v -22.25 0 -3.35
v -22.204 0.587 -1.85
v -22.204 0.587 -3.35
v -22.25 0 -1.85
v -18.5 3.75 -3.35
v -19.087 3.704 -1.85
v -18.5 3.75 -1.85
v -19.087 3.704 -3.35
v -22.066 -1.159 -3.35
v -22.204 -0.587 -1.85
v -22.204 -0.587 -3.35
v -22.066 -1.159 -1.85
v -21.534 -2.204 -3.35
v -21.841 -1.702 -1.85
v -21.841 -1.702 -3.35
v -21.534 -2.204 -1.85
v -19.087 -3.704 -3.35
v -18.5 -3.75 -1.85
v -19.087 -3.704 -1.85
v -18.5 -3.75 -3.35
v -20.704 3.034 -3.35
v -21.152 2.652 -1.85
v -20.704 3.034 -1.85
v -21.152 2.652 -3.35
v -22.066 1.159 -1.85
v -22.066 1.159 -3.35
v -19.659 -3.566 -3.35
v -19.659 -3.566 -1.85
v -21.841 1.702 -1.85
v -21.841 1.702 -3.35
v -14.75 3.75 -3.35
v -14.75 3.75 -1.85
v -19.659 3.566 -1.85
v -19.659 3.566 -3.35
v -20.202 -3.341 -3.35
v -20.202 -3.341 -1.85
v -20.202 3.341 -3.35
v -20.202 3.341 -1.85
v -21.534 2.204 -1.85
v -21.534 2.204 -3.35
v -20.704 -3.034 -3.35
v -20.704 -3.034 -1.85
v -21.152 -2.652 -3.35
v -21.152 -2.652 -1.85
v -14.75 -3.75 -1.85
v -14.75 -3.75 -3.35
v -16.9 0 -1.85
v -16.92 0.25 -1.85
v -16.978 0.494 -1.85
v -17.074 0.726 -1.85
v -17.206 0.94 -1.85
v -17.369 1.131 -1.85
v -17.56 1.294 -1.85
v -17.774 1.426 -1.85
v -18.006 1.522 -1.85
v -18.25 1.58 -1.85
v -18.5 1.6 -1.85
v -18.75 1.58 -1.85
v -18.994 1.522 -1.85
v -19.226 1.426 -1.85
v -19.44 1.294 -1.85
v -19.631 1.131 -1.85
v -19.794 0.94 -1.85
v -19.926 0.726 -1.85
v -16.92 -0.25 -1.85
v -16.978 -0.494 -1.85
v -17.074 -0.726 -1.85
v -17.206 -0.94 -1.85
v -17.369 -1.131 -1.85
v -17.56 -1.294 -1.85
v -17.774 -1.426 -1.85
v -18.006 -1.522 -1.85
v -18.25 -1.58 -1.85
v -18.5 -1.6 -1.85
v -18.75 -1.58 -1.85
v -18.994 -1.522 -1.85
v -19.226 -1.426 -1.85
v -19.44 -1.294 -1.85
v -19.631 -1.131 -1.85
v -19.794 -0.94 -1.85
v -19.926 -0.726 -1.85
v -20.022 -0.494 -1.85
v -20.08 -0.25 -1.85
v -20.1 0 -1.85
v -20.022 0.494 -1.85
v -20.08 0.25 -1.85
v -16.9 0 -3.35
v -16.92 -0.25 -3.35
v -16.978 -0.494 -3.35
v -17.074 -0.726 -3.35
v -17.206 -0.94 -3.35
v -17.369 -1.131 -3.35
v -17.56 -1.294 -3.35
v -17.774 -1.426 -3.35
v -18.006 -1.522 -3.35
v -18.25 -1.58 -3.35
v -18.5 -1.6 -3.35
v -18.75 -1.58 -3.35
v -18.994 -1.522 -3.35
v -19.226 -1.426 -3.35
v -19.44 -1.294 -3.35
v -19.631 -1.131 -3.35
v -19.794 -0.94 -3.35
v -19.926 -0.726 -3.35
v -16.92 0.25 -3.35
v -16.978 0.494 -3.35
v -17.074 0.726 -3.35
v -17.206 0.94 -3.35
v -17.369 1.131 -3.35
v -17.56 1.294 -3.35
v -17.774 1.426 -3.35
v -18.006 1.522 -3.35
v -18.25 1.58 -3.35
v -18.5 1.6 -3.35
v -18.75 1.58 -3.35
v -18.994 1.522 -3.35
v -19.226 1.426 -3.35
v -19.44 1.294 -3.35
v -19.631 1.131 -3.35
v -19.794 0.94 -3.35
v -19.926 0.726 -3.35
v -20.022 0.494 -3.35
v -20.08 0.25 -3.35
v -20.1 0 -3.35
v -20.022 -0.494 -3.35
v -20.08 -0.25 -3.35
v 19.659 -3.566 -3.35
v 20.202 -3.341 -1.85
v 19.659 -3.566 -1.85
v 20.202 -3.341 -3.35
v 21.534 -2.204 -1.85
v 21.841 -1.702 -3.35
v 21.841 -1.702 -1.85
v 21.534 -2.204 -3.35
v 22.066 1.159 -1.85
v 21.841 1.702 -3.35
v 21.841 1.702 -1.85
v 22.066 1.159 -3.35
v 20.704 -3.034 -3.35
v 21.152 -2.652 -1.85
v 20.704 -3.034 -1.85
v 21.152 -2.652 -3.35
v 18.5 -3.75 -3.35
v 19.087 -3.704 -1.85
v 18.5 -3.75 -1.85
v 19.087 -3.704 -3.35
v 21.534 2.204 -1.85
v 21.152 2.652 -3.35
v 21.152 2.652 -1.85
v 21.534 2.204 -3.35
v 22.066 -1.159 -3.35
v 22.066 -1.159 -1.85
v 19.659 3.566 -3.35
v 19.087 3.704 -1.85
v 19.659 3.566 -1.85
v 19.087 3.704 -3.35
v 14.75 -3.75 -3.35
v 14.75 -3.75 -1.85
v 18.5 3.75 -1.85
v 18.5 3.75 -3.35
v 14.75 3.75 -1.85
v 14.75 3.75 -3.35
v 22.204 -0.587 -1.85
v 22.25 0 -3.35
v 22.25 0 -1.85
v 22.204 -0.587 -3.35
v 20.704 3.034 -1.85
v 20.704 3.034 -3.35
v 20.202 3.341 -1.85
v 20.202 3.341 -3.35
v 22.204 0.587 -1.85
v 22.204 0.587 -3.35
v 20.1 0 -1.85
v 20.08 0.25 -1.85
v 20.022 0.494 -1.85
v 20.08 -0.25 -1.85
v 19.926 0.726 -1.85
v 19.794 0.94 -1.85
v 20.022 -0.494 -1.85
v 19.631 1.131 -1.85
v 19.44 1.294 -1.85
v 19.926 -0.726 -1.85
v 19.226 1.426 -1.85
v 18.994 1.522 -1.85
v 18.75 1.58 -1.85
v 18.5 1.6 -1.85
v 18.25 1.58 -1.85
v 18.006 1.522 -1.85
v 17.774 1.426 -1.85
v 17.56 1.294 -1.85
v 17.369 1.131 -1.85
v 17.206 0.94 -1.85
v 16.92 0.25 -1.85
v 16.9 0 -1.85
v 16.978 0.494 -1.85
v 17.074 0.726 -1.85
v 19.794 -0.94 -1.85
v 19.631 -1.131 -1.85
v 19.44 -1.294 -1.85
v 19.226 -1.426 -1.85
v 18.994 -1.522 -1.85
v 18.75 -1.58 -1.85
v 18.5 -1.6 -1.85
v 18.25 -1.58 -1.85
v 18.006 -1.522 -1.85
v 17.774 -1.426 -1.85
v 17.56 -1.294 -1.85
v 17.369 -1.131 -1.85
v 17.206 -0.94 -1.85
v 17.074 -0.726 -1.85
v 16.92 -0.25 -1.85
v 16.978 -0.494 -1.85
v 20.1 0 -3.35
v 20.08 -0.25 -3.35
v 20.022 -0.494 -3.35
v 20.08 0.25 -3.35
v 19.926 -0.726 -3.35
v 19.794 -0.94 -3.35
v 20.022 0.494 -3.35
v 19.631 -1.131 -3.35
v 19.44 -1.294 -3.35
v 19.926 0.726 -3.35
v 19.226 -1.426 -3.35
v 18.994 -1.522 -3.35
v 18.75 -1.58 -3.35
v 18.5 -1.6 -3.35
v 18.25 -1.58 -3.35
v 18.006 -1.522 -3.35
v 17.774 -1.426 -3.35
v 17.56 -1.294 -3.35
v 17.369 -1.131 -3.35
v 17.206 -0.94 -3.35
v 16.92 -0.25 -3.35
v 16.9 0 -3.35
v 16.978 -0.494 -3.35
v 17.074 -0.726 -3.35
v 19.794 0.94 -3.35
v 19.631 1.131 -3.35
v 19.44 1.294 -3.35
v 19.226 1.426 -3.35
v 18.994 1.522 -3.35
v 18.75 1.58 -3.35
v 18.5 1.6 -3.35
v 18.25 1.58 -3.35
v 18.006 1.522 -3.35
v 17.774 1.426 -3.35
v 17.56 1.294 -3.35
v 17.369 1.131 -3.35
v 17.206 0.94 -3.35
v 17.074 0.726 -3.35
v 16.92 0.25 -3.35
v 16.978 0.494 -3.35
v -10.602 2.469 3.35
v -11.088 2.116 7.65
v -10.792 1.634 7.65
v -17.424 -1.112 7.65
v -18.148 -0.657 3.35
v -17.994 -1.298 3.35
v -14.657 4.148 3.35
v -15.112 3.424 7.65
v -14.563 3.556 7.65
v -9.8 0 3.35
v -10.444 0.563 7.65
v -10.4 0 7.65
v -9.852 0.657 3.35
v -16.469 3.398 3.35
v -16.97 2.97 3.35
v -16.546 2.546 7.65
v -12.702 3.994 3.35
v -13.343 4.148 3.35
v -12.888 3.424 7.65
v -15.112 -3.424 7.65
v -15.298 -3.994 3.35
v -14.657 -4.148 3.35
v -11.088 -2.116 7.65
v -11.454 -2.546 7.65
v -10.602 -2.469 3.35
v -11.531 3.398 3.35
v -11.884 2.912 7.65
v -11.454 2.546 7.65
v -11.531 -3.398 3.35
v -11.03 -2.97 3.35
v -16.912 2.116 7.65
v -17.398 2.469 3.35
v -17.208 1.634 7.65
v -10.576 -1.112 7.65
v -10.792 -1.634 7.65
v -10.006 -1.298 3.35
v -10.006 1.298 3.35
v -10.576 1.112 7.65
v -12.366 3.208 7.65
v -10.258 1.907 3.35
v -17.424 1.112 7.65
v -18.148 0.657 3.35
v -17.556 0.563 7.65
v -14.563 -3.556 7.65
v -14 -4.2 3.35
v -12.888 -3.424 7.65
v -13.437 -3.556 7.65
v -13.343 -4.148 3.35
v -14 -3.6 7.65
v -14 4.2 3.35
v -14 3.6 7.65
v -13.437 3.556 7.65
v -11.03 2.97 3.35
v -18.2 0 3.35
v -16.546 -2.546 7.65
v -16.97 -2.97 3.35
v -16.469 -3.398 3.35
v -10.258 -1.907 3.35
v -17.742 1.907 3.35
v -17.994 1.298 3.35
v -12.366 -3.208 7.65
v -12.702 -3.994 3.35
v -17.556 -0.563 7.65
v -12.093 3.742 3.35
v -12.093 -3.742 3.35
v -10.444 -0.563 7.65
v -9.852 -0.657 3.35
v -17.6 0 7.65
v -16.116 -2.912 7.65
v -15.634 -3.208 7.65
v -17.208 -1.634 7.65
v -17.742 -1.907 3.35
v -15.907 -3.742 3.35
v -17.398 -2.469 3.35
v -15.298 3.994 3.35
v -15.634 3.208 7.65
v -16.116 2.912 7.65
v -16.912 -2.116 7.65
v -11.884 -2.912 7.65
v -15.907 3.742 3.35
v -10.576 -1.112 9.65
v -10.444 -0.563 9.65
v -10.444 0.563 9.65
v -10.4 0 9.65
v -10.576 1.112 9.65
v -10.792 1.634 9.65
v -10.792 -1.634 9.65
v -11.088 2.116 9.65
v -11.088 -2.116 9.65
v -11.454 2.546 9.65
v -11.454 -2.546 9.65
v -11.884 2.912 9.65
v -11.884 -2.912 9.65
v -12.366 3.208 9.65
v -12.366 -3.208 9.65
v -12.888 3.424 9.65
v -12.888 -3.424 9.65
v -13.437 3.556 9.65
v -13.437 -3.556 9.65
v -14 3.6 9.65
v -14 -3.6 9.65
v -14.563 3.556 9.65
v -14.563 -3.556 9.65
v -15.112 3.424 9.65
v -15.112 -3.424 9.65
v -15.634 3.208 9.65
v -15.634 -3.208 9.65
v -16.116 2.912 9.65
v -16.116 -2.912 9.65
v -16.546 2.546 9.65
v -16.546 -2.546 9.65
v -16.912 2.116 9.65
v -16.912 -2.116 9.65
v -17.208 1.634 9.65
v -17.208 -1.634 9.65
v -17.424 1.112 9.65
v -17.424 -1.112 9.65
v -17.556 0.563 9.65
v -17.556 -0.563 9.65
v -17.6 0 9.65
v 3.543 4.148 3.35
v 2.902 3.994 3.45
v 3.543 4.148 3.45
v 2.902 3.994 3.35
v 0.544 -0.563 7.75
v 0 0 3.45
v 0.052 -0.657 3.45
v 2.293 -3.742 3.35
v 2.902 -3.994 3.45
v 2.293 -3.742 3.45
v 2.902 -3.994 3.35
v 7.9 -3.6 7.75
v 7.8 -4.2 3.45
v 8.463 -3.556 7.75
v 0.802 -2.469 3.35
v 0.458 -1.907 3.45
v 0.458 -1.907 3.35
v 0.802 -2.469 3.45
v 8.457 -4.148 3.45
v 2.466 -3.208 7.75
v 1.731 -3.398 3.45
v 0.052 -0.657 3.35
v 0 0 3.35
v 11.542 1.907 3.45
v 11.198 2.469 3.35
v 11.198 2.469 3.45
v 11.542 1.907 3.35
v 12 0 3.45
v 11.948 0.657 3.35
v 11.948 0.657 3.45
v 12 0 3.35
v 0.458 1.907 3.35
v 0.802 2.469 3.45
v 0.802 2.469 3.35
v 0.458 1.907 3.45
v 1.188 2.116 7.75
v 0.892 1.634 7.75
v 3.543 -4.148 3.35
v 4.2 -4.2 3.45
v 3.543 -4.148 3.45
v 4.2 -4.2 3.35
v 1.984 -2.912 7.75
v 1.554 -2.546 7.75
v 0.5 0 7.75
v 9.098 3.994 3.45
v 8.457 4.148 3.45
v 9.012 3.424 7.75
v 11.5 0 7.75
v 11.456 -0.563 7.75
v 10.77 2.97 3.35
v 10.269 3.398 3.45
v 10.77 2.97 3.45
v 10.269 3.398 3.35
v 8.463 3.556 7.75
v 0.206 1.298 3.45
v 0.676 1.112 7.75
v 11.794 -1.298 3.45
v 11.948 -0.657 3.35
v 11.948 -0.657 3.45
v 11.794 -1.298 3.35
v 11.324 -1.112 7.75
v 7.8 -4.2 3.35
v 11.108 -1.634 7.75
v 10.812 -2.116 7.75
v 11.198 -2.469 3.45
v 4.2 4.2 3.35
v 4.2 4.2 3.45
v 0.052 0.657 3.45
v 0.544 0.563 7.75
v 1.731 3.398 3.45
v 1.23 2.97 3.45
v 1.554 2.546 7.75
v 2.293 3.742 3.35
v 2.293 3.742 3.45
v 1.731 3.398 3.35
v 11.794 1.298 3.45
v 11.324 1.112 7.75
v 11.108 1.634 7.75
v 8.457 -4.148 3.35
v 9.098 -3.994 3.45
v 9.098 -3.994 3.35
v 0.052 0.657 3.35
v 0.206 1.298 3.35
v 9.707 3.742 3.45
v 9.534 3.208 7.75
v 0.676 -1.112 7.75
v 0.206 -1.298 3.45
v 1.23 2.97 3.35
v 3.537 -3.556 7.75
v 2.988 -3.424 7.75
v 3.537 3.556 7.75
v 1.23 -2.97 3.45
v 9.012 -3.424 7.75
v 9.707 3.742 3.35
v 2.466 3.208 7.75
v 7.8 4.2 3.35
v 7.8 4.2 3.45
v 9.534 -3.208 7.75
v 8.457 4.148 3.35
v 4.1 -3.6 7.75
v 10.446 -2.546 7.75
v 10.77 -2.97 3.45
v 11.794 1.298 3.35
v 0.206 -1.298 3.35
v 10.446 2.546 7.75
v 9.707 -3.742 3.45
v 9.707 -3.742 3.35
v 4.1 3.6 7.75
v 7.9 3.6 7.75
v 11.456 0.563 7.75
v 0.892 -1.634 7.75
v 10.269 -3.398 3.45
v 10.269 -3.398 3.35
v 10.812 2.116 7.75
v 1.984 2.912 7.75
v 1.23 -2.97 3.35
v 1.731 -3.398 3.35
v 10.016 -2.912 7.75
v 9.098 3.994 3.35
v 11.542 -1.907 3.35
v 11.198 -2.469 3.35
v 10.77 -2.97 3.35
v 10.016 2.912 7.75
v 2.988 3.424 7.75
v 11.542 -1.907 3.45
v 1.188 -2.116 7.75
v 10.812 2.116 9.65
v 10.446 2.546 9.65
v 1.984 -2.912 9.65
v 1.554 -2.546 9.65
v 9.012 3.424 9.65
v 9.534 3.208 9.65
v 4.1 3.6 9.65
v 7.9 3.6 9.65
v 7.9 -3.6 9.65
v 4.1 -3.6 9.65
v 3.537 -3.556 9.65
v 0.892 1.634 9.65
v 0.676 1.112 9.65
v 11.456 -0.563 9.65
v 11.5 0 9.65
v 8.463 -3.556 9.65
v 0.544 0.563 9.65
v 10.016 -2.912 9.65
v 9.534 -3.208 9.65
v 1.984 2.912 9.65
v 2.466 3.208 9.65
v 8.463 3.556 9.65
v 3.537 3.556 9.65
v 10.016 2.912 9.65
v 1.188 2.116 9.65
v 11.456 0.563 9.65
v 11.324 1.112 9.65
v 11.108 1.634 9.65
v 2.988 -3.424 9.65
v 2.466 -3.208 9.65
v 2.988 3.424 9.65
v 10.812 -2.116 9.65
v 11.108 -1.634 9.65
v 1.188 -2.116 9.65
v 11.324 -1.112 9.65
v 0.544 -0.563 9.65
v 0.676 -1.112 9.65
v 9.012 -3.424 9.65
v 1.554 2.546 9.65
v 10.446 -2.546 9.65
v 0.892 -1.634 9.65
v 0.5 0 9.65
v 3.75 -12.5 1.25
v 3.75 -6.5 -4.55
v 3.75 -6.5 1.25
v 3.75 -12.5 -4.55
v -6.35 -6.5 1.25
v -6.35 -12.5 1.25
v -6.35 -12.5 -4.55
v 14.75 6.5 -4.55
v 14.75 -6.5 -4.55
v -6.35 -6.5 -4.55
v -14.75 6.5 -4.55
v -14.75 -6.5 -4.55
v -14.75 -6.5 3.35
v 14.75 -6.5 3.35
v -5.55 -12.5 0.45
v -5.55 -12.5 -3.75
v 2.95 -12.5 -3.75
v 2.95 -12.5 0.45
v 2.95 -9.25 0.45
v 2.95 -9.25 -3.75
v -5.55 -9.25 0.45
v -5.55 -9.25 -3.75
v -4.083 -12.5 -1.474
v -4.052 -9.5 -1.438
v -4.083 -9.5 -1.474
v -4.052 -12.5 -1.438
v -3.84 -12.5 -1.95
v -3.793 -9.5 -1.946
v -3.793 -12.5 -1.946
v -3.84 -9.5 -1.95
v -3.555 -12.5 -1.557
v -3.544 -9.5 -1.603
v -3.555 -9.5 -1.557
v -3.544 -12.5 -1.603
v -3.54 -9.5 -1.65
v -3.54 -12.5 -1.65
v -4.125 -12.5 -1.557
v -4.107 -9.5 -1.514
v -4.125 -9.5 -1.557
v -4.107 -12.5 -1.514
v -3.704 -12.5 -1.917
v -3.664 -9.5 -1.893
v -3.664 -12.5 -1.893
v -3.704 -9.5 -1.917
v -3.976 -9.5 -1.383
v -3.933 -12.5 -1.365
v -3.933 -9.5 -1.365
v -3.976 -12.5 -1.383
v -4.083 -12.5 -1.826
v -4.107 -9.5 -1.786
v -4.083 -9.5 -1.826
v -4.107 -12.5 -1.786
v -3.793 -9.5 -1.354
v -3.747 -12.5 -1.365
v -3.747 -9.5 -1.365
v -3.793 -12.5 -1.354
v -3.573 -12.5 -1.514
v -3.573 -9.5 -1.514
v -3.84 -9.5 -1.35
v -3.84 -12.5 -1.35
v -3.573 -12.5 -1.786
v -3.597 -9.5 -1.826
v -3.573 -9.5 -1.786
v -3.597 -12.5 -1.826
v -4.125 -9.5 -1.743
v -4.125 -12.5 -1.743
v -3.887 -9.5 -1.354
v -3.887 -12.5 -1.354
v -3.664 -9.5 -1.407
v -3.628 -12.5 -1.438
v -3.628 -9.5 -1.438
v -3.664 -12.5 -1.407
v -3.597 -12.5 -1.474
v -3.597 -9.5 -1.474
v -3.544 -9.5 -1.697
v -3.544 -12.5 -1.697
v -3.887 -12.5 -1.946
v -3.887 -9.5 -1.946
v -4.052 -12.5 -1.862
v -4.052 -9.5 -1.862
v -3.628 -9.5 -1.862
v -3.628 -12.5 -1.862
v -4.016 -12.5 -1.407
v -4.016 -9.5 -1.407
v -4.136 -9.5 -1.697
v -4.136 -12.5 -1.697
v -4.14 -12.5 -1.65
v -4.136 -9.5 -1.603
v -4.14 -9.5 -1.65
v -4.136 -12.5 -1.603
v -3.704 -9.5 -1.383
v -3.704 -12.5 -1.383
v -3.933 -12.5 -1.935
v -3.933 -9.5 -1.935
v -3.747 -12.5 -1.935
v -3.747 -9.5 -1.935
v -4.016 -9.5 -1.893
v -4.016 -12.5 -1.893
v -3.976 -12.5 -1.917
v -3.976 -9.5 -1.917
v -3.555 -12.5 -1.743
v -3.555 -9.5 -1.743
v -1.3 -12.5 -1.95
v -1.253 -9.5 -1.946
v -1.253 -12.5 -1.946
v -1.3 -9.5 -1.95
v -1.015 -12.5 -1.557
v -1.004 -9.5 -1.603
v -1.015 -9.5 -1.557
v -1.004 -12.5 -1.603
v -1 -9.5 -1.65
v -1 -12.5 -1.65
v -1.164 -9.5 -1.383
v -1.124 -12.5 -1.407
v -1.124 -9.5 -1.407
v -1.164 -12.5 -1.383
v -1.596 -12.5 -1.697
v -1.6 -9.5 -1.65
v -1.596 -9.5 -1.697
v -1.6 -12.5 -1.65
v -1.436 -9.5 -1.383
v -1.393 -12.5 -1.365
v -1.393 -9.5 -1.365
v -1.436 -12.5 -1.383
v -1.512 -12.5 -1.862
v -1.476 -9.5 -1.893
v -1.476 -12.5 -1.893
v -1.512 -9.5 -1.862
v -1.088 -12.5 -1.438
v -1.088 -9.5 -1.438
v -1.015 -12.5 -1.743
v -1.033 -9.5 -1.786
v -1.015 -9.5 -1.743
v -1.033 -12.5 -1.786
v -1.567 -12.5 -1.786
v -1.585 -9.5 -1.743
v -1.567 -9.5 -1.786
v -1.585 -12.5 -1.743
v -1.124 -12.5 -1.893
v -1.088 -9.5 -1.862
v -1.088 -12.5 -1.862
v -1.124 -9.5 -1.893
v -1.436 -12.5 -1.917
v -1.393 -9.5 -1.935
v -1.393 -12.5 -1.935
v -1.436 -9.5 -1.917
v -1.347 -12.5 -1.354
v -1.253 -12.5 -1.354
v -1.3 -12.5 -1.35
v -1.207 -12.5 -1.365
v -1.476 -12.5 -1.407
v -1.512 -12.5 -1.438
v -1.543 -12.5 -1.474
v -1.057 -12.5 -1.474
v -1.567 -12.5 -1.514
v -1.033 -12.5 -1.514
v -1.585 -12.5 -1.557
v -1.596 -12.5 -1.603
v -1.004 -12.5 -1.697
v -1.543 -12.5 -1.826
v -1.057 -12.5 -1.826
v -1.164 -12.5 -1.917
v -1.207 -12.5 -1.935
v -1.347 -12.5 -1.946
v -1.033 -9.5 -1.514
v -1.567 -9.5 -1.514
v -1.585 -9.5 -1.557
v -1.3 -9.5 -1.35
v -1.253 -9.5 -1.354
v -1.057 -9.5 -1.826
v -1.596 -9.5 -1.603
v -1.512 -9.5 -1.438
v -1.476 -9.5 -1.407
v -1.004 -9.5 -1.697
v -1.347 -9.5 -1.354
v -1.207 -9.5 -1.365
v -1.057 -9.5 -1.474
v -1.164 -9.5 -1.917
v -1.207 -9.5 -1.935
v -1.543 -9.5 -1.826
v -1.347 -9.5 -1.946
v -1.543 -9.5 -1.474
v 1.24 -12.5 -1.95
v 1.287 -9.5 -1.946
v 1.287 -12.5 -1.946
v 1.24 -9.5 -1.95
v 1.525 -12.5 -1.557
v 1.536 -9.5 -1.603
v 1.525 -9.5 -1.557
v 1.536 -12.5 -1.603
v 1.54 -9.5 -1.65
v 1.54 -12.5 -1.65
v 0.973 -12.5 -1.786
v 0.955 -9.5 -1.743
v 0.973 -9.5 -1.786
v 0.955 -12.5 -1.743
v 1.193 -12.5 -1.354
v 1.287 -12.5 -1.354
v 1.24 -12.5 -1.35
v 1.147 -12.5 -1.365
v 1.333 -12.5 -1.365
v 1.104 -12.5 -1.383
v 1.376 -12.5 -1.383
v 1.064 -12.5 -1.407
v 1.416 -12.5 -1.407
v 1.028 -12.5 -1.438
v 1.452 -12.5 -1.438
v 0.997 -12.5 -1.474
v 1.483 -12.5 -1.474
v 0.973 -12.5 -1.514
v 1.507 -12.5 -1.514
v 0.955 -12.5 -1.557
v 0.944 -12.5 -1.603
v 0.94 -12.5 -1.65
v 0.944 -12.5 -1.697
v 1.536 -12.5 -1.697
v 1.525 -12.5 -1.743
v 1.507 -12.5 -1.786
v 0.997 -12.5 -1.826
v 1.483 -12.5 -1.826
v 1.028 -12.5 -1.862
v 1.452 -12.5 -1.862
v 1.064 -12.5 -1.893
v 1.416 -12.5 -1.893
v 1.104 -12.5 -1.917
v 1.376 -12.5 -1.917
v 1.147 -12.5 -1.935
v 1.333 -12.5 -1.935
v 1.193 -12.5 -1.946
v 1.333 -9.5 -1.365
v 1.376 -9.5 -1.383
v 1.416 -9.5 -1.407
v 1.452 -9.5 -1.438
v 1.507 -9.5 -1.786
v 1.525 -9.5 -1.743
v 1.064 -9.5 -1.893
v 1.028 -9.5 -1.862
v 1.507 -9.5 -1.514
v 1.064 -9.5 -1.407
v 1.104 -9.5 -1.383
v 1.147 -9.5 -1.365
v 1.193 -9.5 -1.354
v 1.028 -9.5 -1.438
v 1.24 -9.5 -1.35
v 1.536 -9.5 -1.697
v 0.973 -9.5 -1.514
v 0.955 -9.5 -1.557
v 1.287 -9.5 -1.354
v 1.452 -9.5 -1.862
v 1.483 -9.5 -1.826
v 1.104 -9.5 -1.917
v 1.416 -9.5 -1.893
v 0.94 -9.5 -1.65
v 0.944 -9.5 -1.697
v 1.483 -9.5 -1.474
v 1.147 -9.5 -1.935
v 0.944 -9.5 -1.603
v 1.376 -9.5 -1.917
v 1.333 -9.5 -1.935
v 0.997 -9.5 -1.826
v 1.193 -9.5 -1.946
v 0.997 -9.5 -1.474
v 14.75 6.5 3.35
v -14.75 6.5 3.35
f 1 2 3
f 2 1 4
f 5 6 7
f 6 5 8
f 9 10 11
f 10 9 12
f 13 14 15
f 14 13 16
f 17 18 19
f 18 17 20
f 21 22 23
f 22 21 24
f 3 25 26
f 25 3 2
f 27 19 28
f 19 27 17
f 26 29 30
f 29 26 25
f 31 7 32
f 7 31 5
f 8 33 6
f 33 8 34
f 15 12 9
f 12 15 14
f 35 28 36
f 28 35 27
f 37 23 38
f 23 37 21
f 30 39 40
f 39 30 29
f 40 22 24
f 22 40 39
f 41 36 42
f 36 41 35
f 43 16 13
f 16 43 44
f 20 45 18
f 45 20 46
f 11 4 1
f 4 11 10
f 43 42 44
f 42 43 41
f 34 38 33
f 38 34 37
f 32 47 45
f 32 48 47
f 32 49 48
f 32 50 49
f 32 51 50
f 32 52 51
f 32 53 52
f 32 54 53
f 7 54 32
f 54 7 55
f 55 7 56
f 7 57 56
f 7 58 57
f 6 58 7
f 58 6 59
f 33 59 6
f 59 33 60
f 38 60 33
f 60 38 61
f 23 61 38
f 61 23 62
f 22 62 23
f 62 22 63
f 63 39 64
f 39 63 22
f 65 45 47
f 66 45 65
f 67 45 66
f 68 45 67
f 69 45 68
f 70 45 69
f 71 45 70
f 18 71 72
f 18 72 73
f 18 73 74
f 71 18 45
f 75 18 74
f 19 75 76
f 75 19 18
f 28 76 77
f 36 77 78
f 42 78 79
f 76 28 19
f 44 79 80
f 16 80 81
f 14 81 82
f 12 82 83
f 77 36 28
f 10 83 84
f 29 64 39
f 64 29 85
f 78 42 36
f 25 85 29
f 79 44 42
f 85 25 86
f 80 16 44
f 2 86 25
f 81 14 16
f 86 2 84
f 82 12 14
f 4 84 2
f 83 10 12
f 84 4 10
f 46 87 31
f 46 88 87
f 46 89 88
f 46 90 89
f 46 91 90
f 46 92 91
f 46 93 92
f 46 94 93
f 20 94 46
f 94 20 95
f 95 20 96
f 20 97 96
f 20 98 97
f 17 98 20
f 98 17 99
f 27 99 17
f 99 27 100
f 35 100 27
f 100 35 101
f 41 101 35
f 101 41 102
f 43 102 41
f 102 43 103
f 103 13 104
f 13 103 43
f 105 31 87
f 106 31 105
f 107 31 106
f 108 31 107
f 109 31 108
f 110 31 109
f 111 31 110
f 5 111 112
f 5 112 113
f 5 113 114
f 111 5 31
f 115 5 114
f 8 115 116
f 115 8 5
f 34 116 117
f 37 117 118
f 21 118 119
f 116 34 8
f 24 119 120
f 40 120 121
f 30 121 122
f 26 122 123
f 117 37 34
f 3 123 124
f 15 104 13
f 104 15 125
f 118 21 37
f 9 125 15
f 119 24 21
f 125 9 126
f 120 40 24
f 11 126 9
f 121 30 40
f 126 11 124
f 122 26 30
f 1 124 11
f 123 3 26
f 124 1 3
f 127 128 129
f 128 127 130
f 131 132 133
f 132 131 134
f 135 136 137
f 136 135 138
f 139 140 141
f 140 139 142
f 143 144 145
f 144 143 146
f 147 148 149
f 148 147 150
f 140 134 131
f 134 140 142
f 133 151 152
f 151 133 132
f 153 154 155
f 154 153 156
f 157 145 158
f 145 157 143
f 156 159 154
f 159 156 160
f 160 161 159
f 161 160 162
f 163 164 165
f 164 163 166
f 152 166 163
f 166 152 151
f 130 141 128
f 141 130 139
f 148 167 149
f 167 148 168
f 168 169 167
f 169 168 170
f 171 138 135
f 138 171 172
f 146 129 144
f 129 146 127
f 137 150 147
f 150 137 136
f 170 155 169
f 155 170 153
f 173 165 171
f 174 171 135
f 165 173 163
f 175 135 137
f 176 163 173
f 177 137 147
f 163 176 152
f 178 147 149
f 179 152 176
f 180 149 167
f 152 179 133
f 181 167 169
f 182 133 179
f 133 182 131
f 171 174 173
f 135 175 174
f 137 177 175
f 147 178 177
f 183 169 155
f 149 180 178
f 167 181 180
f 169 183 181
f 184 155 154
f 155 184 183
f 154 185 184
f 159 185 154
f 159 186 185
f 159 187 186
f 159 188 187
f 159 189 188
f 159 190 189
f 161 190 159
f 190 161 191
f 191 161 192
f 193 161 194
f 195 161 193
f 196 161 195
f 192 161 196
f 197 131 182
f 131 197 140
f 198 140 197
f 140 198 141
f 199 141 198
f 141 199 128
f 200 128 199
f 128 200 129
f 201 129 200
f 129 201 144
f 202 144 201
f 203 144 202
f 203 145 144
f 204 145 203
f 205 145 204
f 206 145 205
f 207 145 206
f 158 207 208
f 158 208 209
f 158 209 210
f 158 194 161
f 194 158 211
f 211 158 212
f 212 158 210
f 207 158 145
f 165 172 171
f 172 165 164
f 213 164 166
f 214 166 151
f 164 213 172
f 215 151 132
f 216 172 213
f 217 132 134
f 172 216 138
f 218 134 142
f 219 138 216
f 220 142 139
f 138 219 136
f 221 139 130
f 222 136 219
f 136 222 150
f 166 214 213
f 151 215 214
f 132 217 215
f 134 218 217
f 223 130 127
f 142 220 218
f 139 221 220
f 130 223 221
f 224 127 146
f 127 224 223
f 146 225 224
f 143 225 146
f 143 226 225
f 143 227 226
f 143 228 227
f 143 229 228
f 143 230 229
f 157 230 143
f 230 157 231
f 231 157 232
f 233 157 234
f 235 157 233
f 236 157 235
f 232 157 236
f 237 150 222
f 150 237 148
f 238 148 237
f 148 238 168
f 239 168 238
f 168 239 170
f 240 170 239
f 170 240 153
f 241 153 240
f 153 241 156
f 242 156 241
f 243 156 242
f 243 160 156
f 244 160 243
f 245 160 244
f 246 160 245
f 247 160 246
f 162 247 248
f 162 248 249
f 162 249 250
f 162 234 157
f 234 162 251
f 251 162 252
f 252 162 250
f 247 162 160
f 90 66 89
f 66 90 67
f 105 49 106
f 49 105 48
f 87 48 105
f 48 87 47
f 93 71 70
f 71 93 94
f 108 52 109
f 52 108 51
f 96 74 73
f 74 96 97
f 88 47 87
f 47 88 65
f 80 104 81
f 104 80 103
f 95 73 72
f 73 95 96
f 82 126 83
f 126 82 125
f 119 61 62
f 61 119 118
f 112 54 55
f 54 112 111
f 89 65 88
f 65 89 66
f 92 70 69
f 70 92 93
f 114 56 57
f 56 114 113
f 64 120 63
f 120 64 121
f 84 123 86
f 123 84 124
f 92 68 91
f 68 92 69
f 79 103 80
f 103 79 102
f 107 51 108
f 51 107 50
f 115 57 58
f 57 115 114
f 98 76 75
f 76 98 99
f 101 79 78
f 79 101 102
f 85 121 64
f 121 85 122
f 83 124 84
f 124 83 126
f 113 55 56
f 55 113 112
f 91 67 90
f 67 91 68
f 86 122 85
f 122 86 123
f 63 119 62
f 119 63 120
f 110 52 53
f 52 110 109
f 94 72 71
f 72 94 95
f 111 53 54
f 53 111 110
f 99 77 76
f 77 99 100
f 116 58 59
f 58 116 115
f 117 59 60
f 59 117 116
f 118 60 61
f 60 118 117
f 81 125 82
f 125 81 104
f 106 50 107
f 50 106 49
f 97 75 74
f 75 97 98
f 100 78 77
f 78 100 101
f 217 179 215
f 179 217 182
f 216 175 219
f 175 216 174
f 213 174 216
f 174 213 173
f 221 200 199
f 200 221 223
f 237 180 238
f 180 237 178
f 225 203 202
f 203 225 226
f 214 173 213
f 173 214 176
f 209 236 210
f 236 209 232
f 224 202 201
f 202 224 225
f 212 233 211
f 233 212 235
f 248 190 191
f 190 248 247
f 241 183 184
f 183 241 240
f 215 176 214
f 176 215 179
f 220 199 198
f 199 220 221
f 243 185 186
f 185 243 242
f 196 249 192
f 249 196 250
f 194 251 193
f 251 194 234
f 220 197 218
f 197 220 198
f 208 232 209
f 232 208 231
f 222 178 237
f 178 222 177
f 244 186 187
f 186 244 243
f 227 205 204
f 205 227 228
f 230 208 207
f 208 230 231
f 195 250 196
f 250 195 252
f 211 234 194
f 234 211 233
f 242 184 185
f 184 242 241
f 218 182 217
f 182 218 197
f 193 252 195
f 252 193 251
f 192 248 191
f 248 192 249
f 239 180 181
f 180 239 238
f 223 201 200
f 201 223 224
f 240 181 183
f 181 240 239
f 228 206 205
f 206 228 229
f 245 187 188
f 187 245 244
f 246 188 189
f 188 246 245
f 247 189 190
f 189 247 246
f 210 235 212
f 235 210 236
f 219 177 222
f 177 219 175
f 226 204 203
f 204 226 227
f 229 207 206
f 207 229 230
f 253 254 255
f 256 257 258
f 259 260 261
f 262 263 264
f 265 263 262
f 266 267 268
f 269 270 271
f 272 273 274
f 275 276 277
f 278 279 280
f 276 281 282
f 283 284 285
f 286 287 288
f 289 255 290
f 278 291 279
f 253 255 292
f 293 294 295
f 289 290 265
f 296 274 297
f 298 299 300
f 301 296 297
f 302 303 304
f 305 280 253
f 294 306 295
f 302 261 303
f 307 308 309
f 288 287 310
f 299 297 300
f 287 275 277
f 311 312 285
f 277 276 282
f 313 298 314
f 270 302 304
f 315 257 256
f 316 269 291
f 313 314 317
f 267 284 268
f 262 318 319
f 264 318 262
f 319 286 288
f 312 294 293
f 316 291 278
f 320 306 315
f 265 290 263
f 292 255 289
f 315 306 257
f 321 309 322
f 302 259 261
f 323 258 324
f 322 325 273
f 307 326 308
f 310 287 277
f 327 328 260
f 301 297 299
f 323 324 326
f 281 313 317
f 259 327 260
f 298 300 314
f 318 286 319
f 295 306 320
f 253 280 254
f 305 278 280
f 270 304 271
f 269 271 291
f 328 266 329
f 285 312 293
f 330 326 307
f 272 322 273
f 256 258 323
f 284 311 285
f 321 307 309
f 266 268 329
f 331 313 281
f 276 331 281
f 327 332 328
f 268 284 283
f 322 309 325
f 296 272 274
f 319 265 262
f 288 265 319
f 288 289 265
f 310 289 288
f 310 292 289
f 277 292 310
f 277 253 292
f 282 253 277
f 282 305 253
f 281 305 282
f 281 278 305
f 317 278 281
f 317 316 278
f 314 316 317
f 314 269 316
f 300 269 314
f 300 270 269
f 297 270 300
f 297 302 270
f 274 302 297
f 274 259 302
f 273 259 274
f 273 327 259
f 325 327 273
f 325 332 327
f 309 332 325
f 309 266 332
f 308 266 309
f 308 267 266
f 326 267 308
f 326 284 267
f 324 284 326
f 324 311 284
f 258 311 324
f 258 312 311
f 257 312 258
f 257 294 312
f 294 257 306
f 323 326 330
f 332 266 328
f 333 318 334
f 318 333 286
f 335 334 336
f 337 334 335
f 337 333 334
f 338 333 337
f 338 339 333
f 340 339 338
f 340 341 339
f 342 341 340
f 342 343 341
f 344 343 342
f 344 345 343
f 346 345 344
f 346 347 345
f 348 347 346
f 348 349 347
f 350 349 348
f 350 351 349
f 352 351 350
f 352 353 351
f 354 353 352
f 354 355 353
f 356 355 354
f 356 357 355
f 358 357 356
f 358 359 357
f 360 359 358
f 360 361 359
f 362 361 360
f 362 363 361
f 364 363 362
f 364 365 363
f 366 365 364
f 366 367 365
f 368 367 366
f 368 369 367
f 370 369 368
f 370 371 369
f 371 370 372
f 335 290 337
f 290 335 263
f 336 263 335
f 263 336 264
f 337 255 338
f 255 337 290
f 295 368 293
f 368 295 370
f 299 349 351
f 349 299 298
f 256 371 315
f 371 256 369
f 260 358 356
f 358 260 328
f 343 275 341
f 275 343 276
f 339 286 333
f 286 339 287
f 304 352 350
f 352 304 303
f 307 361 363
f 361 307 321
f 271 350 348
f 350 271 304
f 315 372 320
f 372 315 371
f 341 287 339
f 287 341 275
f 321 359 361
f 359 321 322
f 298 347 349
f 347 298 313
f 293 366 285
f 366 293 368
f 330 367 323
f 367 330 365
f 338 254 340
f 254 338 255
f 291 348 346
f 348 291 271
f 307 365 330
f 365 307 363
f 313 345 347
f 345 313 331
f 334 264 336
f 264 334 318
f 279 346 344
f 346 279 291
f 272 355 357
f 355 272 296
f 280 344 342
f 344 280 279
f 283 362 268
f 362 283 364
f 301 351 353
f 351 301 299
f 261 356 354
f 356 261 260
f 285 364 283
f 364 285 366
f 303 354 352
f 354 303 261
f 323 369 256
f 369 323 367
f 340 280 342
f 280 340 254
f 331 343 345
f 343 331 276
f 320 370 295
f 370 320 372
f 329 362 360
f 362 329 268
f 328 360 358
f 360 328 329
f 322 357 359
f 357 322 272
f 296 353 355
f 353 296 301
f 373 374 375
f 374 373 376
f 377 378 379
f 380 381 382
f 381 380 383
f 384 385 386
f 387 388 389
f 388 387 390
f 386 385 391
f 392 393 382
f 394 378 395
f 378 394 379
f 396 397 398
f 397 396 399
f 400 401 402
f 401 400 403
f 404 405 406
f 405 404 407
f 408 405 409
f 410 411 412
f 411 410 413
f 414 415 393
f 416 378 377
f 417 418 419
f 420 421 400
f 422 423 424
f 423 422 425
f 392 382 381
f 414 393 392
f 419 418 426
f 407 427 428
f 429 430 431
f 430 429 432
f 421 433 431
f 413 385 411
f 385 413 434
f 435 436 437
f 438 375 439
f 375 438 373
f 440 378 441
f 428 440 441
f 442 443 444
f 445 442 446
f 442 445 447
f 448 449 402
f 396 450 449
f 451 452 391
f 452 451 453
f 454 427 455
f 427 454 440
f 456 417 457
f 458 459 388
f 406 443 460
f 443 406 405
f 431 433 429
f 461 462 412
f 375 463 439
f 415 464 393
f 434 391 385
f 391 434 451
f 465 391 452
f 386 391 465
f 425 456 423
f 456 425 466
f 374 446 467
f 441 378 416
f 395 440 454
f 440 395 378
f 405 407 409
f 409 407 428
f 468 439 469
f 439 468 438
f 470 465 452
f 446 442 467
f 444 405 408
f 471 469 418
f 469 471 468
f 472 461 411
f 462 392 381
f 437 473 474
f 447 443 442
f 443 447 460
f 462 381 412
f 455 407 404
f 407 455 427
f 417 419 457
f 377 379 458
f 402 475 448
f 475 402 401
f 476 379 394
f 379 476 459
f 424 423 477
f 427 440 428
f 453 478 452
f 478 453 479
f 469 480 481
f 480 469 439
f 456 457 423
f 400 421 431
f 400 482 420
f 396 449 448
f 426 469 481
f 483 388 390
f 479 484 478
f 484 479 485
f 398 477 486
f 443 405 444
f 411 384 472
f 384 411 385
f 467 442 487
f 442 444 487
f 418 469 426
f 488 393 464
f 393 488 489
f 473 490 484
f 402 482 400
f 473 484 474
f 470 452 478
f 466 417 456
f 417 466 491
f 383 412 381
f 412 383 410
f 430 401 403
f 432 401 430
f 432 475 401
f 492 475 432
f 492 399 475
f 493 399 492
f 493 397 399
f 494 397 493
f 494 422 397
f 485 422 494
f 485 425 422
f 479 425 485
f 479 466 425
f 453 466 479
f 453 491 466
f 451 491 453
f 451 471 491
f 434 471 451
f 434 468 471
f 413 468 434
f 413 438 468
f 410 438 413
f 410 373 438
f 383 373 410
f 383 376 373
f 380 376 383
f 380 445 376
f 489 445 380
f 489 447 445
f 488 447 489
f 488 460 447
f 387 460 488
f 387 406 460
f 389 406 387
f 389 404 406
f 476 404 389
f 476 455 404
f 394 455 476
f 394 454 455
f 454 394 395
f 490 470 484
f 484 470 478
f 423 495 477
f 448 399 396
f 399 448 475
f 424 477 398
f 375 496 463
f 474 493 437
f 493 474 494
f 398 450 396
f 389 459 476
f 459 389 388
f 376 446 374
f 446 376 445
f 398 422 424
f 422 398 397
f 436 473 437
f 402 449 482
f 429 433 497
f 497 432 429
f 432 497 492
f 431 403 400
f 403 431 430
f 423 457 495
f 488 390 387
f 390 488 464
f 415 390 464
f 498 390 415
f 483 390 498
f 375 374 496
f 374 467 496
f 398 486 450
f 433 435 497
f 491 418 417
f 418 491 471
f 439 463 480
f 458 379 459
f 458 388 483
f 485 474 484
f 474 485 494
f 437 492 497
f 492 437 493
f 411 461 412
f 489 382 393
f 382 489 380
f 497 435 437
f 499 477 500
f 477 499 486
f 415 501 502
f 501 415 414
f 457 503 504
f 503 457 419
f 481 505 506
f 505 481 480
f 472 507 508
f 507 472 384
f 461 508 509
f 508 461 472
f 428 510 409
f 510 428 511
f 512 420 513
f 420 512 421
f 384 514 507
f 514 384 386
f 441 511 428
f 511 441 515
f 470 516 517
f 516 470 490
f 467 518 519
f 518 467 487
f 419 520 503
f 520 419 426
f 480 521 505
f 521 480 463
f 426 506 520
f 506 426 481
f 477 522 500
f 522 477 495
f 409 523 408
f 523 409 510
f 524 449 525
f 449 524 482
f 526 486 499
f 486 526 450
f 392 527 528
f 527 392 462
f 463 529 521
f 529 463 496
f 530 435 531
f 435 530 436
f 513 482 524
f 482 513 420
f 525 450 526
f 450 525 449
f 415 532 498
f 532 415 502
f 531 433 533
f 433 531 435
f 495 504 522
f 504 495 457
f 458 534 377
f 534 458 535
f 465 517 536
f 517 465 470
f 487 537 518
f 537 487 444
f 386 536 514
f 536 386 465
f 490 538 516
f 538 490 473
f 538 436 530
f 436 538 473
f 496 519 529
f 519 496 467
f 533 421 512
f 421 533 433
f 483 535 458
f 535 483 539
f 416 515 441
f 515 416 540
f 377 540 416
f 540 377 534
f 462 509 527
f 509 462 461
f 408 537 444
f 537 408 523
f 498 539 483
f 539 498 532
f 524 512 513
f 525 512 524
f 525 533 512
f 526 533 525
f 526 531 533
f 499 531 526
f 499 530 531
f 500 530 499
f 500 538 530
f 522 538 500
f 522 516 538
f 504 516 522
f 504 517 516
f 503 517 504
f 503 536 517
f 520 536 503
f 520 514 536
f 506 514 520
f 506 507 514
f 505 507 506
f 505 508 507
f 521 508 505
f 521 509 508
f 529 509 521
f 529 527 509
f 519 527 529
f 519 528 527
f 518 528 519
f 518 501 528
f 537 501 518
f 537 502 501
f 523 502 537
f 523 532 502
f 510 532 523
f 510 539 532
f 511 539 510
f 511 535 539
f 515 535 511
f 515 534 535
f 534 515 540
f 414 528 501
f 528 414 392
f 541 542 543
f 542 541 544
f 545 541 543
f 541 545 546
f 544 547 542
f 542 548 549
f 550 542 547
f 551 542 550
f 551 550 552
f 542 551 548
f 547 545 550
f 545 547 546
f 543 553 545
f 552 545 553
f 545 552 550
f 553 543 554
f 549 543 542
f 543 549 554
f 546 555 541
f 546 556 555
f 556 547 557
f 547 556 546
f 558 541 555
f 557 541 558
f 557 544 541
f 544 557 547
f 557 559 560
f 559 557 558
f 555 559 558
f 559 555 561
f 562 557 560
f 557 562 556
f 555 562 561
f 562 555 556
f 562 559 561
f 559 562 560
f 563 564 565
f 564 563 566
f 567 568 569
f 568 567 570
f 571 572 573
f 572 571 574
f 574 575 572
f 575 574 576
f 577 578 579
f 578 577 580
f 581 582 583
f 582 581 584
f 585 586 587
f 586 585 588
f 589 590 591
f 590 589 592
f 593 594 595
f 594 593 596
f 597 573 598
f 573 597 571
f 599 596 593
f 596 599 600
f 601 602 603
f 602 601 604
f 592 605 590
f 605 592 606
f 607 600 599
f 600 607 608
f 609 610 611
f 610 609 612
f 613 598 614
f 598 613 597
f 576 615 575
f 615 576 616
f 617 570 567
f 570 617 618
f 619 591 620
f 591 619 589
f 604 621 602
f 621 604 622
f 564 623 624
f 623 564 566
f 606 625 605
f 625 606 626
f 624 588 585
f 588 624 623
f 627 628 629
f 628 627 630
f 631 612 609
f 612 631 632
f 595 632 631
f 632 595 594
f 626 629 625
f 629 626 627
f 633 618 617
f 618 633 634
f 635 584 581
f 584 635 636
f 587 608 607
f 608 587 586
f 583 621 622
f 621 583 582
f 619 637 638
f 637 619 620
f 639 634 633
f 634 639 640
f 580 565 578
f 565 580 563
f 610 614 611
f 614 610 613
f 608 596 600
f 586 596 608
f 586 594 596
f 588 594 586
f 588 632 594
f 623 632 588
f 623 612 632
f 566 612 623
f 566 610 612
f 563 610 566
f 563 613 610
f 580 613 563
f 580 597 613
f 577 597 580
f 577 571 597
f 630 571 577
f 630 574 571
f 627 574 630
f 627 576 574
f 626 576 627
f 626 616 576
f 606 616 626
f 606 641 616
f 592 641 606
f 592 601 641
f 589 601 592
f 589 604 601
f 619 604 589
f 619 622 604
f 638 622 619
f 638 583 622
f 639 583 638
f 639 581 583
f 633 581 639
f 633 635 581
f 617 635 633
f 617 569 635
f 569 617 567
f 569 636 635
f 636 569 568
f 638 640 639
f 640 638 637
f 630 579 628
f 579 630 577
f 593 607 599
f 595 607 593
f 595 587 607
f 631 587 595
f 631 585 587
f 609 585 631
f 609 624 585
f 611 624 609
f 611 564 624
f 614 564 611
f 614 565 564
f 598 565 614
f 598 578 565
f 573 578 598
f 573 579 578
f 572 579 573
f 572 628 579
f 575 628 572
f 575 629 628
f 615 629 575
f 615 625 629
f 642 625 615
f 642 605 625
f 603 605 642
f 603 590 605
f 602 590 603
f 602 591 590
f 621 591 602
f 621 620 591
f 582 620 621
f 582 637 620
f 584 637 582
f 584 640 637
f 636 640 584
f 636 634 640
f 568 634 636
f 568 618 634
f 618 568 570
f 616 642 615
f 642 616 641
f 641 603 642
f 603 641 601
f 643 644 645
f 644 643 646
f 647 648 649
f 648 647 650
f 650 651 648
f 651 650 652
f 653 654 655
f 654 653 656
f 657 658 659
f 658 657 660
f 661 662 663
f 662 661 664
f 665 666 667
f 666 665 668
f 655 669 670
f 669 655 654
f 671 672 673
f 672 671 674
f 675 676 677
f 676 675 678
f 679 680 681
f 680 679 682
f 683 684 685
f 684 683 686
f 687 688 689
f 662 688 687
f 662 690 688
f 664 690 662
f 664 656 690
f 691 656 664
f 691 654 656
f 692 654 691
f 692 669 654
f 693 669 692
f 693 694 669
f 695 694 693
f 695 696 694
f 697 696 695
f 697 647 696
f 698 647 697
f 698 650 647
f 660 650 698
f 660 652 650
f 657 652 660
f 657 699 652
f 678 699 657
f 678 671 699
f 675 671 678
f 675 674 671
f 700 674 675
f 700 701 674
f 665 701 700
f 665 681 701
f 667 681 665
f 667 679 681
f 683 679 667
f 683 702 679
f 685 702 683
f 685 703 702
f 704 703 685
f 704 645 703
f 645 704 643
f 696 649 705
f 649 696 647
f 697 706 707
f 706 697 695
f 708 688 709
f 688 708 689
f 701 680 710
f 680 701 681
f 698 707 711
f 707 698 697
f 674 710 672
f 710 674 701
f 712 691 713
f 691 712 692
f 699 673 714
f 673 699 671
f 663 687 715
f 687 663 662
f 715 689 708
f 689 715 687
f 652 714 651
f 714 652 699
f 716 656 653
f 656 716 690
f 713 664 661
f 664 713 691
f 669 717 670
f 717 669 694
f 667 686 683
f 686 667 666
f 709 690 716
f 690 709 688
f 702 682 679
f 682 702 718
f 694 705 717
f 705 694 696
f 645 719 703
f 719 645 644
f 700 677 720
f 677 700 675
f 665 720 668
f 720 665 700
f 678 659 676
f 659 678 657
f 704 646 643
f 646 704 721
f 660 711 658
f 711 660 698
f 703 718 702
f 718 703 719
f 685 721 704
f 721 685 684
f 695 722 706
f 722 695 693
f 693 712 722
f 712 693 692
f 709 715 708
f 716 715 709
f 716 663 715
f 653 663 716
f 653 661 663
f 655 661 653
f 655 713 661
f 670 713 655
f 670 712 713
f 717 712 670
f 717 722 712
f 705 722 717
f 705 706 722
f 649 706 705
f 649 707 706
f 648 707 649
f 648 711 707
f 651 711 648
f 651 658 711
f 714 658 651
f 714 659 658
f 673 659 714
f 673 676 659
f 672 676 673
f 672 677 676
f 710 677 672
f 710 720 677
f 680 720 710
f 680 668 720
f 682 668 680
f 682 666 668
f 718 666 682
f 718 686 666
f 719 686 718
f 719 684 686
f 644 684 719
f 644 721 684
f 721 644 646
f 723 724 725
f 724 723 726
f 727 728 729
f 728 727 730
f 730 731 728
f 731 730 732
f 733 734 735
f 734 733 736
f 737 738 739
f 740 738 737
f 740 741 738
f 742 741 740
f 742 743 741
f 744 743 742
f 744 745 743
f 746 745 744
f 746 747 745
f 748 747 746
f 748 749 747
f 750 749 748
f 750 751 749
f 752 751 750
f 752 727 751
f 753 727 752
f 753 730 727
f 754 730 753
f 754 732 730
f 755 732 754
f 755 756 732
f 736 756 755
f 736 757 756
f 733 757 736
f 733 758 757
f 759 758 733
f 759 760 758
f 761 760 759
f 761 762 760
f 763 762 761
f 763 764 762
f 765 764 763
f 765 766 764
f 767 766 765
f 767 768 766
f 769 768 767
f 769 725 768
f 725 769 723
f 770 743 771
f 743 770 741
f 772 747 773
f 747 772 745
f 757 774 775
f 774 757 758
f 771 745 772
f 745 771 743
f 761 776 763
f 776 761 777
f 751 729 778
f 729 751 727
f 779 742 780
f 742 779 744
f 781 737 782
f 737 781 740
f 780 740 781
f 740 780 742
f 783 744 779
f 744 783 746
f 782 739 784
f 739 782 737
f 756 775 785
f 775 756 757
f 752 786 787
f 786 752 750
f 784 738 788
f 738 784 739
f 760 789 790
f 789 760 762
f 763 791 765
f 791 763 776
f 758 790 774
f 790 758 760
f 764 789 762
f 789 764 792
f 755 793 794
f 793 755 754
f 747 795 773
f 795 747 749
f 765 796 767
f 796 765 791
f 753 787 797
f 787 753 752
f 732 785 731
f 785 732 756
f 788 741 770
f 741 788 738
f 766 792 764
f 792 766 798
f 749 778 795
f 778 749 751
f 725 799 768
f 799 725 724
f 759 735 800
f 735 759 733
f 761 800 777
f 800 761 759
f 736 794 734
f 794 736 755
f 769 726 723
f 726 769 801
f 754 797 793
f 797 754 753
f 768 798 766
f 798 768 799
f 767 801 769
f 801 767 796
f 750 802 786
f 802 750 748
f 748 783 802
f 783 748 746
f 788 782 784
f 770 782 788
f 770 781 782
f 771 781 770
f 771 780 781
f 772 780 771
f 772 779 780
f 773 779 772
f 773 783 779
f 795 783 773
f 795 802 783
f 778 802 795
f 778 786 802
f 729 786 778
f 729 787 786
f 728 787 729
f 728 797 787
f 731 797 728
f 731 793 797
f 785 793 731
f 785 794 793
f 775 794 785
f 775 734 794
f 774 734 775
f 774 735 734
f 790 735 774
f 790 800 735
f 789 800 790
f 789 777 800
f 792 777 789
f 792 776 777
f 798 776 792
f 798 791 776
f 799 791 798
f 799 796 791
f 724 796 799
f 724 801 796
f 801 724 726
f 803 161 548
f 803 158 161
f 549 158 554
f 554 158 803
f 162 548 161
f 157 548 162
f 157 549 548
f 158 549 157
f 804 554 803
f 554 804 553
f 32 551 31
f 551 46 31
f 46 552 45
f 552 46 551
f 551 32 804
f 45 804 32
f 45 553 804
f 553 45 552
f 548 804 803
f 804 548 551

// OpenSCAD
// Sharp GP2Y0A21YK0F Distance Measuring Sensor Model
// Coordinate System: Units in mm, Origin (0,0,0) at the center of the main body.

$fn = 40;

// Dimensions
case_w = 29.5;
case_h = 13.0;
case_d = 6.7;

flange_thickness = 1.5;
hole_dist = 37.0;
hole_r = 3.2 / 2;
flange_r = 3.75;

// Render assembly
main_case();
flanges();
pwb();
lenses();
connector();

// 1. Main Case Body
module main_case() {
    color("dimgray") {
        cube([case_w, case_h, case_d], center=true);
    }
}

// 2. Mounting Flanges (Left & Right Ears with Holes)
module flanges() {
    color("dimgray") {
        difference() {
            union() {
                // Left flange transition & ear
                hull() {
                    translate([-case_w/2, 0, -case_d/2 + flange_thickness/2])
                        cube([0.1, flange_r * 2, flange_thickness], center=true);
                    translate([-hole_dist/2, 0, -case_d/2 + flange_thickness/2])
                        cylinder(h=flange_thickness, r=flange_r, center=true);
                }
                // Right flange transition & ear
                hull() {
                    translate([case_w/2, 0, -case_d/2 + flange_thickness/2])
                        cube([0.1, flange_r * 2, flange_thickness], center=true);
                    translate([hole_dist/2, 0, -case_d/2 + flange_thickness/2])
                        cylinder(h=flange_thickness, r=flange_r, center=true);
                }
            }
            // Left screw hole
            translate([-hole_dist/2, 0, -case_d/2])
                cylinder(h=flange_thickness + 2, r=hole_r, center=true);
            // Right screw hole
            translate([hole_dist/2, 0, -case_d/2])
                cylinder(h=flange_thickness + 2, r=hole_r, center=true);
        }
    }
}

// 3. PWB (Printed Wiring Board) on the back
module pwb() {
    color("sienna") { // Paper phenol brown
        translate([0, 0, -case_d/2 - 1.2/2])
            cube([case_w, case_h, 1.2], center=true);
    }
}

// 4. Emitter and Detector Lens Cases
module lenses() {
    // Light emitter (Left side, round lens case)
    emitter_x = -14.0; // Center relative to origin
    color("dimgray") {
        translate([emitter_x, 0, case_d/2]) {
            // Tapered base (6.3mm total height, 4.3mm base)
            cylinder(h=4.3, d1=8.4, d2=7.2);
            // Tip (2.0mm height)
            translate([0, 0, 4.3])
                cylinder(h=2.0, d=7.2);
        }
    }
    // Emitter Lens (Inside)
    color("cyan", 0.5) {
        translate([emitter_x, 0, case_d/2 + 4.3])
            cylinder(h=1.9, d=5.5);
    }

    // Light detector (Right side, elongated lens case)
    detector_x = 6.0; // Center relative to origin
    color("dimgray") {
        translate([detector_x, 0, case_d/2]) {
            // Tapered base (from width 12.0/height 8.4 to width 11.0/height 7.2)
            hull() {
                // At z=0
                translate([-1.8, 0, 0]) cylinder(h=0.1, r=4.2);
                translate([ 1.8, 0, 0]) cylinder(h=0.1, r=4.2);
                // At z=4.3
                translate([-1.9, 0, 4.3]) cylinder(h=0.1, r=3.6);
                translate([ 1.9, 0, 4.3]) cylinder(h=0.1, r=3.6);
            }
            // Tip (z=4.3 to 6.3)
            hull() {
                translate([-1.9, 0, 4.3]) cylinder(h=2.0, r=3.6);
                translate([ 1.9, 0, 4.3]) cylinder(h=2.0, r=3.6);
            }
        }
    }
    // Detector Lens (Inside)
    color("cyan", 0.5) {
        translate([detector_x, 0, case_d/2 + 4.3]) {
            hull() {
                translate([-1.5, 0, 0]) cylinder(h=1.9, r=2.5);
                translate([ 1.5, 0, 0]) cylinder(h=1.9, r=2.5);
            }
        }
    }
}

// 5. Connector (Bottom side)
module connector() {
    // Width: 10.1mm, Positioned offset to the left.
    // X center = -1.3 (span from -6.35 to 3.75)
    color("white") {
        difference() {
            // Connector housing
            translate([-1.3, -case_h/2 - 3.0, -4.55 + 2.9])
                cube([10.1, 6.0, 5.8], center=true);

            // Slot for pins
            translate([-1.3, -case_h/2 - 4.5, -4.55 + 2.9])
                cube([8.5, 3.5, 4.2], center=true);
        }
    }
    // 3 Pin contacts
    color("gold") {
        for (x = [-1.3 - 2.54, -1.3, -1.3 + 2.54]) {
            translate([x, -case_h/2 - 4.5, -4.55 + 2.9])
                rotate([90, 0, 0])
                    cylinder(h=3.0, d=0.6, center=true);
        }
    }
}
